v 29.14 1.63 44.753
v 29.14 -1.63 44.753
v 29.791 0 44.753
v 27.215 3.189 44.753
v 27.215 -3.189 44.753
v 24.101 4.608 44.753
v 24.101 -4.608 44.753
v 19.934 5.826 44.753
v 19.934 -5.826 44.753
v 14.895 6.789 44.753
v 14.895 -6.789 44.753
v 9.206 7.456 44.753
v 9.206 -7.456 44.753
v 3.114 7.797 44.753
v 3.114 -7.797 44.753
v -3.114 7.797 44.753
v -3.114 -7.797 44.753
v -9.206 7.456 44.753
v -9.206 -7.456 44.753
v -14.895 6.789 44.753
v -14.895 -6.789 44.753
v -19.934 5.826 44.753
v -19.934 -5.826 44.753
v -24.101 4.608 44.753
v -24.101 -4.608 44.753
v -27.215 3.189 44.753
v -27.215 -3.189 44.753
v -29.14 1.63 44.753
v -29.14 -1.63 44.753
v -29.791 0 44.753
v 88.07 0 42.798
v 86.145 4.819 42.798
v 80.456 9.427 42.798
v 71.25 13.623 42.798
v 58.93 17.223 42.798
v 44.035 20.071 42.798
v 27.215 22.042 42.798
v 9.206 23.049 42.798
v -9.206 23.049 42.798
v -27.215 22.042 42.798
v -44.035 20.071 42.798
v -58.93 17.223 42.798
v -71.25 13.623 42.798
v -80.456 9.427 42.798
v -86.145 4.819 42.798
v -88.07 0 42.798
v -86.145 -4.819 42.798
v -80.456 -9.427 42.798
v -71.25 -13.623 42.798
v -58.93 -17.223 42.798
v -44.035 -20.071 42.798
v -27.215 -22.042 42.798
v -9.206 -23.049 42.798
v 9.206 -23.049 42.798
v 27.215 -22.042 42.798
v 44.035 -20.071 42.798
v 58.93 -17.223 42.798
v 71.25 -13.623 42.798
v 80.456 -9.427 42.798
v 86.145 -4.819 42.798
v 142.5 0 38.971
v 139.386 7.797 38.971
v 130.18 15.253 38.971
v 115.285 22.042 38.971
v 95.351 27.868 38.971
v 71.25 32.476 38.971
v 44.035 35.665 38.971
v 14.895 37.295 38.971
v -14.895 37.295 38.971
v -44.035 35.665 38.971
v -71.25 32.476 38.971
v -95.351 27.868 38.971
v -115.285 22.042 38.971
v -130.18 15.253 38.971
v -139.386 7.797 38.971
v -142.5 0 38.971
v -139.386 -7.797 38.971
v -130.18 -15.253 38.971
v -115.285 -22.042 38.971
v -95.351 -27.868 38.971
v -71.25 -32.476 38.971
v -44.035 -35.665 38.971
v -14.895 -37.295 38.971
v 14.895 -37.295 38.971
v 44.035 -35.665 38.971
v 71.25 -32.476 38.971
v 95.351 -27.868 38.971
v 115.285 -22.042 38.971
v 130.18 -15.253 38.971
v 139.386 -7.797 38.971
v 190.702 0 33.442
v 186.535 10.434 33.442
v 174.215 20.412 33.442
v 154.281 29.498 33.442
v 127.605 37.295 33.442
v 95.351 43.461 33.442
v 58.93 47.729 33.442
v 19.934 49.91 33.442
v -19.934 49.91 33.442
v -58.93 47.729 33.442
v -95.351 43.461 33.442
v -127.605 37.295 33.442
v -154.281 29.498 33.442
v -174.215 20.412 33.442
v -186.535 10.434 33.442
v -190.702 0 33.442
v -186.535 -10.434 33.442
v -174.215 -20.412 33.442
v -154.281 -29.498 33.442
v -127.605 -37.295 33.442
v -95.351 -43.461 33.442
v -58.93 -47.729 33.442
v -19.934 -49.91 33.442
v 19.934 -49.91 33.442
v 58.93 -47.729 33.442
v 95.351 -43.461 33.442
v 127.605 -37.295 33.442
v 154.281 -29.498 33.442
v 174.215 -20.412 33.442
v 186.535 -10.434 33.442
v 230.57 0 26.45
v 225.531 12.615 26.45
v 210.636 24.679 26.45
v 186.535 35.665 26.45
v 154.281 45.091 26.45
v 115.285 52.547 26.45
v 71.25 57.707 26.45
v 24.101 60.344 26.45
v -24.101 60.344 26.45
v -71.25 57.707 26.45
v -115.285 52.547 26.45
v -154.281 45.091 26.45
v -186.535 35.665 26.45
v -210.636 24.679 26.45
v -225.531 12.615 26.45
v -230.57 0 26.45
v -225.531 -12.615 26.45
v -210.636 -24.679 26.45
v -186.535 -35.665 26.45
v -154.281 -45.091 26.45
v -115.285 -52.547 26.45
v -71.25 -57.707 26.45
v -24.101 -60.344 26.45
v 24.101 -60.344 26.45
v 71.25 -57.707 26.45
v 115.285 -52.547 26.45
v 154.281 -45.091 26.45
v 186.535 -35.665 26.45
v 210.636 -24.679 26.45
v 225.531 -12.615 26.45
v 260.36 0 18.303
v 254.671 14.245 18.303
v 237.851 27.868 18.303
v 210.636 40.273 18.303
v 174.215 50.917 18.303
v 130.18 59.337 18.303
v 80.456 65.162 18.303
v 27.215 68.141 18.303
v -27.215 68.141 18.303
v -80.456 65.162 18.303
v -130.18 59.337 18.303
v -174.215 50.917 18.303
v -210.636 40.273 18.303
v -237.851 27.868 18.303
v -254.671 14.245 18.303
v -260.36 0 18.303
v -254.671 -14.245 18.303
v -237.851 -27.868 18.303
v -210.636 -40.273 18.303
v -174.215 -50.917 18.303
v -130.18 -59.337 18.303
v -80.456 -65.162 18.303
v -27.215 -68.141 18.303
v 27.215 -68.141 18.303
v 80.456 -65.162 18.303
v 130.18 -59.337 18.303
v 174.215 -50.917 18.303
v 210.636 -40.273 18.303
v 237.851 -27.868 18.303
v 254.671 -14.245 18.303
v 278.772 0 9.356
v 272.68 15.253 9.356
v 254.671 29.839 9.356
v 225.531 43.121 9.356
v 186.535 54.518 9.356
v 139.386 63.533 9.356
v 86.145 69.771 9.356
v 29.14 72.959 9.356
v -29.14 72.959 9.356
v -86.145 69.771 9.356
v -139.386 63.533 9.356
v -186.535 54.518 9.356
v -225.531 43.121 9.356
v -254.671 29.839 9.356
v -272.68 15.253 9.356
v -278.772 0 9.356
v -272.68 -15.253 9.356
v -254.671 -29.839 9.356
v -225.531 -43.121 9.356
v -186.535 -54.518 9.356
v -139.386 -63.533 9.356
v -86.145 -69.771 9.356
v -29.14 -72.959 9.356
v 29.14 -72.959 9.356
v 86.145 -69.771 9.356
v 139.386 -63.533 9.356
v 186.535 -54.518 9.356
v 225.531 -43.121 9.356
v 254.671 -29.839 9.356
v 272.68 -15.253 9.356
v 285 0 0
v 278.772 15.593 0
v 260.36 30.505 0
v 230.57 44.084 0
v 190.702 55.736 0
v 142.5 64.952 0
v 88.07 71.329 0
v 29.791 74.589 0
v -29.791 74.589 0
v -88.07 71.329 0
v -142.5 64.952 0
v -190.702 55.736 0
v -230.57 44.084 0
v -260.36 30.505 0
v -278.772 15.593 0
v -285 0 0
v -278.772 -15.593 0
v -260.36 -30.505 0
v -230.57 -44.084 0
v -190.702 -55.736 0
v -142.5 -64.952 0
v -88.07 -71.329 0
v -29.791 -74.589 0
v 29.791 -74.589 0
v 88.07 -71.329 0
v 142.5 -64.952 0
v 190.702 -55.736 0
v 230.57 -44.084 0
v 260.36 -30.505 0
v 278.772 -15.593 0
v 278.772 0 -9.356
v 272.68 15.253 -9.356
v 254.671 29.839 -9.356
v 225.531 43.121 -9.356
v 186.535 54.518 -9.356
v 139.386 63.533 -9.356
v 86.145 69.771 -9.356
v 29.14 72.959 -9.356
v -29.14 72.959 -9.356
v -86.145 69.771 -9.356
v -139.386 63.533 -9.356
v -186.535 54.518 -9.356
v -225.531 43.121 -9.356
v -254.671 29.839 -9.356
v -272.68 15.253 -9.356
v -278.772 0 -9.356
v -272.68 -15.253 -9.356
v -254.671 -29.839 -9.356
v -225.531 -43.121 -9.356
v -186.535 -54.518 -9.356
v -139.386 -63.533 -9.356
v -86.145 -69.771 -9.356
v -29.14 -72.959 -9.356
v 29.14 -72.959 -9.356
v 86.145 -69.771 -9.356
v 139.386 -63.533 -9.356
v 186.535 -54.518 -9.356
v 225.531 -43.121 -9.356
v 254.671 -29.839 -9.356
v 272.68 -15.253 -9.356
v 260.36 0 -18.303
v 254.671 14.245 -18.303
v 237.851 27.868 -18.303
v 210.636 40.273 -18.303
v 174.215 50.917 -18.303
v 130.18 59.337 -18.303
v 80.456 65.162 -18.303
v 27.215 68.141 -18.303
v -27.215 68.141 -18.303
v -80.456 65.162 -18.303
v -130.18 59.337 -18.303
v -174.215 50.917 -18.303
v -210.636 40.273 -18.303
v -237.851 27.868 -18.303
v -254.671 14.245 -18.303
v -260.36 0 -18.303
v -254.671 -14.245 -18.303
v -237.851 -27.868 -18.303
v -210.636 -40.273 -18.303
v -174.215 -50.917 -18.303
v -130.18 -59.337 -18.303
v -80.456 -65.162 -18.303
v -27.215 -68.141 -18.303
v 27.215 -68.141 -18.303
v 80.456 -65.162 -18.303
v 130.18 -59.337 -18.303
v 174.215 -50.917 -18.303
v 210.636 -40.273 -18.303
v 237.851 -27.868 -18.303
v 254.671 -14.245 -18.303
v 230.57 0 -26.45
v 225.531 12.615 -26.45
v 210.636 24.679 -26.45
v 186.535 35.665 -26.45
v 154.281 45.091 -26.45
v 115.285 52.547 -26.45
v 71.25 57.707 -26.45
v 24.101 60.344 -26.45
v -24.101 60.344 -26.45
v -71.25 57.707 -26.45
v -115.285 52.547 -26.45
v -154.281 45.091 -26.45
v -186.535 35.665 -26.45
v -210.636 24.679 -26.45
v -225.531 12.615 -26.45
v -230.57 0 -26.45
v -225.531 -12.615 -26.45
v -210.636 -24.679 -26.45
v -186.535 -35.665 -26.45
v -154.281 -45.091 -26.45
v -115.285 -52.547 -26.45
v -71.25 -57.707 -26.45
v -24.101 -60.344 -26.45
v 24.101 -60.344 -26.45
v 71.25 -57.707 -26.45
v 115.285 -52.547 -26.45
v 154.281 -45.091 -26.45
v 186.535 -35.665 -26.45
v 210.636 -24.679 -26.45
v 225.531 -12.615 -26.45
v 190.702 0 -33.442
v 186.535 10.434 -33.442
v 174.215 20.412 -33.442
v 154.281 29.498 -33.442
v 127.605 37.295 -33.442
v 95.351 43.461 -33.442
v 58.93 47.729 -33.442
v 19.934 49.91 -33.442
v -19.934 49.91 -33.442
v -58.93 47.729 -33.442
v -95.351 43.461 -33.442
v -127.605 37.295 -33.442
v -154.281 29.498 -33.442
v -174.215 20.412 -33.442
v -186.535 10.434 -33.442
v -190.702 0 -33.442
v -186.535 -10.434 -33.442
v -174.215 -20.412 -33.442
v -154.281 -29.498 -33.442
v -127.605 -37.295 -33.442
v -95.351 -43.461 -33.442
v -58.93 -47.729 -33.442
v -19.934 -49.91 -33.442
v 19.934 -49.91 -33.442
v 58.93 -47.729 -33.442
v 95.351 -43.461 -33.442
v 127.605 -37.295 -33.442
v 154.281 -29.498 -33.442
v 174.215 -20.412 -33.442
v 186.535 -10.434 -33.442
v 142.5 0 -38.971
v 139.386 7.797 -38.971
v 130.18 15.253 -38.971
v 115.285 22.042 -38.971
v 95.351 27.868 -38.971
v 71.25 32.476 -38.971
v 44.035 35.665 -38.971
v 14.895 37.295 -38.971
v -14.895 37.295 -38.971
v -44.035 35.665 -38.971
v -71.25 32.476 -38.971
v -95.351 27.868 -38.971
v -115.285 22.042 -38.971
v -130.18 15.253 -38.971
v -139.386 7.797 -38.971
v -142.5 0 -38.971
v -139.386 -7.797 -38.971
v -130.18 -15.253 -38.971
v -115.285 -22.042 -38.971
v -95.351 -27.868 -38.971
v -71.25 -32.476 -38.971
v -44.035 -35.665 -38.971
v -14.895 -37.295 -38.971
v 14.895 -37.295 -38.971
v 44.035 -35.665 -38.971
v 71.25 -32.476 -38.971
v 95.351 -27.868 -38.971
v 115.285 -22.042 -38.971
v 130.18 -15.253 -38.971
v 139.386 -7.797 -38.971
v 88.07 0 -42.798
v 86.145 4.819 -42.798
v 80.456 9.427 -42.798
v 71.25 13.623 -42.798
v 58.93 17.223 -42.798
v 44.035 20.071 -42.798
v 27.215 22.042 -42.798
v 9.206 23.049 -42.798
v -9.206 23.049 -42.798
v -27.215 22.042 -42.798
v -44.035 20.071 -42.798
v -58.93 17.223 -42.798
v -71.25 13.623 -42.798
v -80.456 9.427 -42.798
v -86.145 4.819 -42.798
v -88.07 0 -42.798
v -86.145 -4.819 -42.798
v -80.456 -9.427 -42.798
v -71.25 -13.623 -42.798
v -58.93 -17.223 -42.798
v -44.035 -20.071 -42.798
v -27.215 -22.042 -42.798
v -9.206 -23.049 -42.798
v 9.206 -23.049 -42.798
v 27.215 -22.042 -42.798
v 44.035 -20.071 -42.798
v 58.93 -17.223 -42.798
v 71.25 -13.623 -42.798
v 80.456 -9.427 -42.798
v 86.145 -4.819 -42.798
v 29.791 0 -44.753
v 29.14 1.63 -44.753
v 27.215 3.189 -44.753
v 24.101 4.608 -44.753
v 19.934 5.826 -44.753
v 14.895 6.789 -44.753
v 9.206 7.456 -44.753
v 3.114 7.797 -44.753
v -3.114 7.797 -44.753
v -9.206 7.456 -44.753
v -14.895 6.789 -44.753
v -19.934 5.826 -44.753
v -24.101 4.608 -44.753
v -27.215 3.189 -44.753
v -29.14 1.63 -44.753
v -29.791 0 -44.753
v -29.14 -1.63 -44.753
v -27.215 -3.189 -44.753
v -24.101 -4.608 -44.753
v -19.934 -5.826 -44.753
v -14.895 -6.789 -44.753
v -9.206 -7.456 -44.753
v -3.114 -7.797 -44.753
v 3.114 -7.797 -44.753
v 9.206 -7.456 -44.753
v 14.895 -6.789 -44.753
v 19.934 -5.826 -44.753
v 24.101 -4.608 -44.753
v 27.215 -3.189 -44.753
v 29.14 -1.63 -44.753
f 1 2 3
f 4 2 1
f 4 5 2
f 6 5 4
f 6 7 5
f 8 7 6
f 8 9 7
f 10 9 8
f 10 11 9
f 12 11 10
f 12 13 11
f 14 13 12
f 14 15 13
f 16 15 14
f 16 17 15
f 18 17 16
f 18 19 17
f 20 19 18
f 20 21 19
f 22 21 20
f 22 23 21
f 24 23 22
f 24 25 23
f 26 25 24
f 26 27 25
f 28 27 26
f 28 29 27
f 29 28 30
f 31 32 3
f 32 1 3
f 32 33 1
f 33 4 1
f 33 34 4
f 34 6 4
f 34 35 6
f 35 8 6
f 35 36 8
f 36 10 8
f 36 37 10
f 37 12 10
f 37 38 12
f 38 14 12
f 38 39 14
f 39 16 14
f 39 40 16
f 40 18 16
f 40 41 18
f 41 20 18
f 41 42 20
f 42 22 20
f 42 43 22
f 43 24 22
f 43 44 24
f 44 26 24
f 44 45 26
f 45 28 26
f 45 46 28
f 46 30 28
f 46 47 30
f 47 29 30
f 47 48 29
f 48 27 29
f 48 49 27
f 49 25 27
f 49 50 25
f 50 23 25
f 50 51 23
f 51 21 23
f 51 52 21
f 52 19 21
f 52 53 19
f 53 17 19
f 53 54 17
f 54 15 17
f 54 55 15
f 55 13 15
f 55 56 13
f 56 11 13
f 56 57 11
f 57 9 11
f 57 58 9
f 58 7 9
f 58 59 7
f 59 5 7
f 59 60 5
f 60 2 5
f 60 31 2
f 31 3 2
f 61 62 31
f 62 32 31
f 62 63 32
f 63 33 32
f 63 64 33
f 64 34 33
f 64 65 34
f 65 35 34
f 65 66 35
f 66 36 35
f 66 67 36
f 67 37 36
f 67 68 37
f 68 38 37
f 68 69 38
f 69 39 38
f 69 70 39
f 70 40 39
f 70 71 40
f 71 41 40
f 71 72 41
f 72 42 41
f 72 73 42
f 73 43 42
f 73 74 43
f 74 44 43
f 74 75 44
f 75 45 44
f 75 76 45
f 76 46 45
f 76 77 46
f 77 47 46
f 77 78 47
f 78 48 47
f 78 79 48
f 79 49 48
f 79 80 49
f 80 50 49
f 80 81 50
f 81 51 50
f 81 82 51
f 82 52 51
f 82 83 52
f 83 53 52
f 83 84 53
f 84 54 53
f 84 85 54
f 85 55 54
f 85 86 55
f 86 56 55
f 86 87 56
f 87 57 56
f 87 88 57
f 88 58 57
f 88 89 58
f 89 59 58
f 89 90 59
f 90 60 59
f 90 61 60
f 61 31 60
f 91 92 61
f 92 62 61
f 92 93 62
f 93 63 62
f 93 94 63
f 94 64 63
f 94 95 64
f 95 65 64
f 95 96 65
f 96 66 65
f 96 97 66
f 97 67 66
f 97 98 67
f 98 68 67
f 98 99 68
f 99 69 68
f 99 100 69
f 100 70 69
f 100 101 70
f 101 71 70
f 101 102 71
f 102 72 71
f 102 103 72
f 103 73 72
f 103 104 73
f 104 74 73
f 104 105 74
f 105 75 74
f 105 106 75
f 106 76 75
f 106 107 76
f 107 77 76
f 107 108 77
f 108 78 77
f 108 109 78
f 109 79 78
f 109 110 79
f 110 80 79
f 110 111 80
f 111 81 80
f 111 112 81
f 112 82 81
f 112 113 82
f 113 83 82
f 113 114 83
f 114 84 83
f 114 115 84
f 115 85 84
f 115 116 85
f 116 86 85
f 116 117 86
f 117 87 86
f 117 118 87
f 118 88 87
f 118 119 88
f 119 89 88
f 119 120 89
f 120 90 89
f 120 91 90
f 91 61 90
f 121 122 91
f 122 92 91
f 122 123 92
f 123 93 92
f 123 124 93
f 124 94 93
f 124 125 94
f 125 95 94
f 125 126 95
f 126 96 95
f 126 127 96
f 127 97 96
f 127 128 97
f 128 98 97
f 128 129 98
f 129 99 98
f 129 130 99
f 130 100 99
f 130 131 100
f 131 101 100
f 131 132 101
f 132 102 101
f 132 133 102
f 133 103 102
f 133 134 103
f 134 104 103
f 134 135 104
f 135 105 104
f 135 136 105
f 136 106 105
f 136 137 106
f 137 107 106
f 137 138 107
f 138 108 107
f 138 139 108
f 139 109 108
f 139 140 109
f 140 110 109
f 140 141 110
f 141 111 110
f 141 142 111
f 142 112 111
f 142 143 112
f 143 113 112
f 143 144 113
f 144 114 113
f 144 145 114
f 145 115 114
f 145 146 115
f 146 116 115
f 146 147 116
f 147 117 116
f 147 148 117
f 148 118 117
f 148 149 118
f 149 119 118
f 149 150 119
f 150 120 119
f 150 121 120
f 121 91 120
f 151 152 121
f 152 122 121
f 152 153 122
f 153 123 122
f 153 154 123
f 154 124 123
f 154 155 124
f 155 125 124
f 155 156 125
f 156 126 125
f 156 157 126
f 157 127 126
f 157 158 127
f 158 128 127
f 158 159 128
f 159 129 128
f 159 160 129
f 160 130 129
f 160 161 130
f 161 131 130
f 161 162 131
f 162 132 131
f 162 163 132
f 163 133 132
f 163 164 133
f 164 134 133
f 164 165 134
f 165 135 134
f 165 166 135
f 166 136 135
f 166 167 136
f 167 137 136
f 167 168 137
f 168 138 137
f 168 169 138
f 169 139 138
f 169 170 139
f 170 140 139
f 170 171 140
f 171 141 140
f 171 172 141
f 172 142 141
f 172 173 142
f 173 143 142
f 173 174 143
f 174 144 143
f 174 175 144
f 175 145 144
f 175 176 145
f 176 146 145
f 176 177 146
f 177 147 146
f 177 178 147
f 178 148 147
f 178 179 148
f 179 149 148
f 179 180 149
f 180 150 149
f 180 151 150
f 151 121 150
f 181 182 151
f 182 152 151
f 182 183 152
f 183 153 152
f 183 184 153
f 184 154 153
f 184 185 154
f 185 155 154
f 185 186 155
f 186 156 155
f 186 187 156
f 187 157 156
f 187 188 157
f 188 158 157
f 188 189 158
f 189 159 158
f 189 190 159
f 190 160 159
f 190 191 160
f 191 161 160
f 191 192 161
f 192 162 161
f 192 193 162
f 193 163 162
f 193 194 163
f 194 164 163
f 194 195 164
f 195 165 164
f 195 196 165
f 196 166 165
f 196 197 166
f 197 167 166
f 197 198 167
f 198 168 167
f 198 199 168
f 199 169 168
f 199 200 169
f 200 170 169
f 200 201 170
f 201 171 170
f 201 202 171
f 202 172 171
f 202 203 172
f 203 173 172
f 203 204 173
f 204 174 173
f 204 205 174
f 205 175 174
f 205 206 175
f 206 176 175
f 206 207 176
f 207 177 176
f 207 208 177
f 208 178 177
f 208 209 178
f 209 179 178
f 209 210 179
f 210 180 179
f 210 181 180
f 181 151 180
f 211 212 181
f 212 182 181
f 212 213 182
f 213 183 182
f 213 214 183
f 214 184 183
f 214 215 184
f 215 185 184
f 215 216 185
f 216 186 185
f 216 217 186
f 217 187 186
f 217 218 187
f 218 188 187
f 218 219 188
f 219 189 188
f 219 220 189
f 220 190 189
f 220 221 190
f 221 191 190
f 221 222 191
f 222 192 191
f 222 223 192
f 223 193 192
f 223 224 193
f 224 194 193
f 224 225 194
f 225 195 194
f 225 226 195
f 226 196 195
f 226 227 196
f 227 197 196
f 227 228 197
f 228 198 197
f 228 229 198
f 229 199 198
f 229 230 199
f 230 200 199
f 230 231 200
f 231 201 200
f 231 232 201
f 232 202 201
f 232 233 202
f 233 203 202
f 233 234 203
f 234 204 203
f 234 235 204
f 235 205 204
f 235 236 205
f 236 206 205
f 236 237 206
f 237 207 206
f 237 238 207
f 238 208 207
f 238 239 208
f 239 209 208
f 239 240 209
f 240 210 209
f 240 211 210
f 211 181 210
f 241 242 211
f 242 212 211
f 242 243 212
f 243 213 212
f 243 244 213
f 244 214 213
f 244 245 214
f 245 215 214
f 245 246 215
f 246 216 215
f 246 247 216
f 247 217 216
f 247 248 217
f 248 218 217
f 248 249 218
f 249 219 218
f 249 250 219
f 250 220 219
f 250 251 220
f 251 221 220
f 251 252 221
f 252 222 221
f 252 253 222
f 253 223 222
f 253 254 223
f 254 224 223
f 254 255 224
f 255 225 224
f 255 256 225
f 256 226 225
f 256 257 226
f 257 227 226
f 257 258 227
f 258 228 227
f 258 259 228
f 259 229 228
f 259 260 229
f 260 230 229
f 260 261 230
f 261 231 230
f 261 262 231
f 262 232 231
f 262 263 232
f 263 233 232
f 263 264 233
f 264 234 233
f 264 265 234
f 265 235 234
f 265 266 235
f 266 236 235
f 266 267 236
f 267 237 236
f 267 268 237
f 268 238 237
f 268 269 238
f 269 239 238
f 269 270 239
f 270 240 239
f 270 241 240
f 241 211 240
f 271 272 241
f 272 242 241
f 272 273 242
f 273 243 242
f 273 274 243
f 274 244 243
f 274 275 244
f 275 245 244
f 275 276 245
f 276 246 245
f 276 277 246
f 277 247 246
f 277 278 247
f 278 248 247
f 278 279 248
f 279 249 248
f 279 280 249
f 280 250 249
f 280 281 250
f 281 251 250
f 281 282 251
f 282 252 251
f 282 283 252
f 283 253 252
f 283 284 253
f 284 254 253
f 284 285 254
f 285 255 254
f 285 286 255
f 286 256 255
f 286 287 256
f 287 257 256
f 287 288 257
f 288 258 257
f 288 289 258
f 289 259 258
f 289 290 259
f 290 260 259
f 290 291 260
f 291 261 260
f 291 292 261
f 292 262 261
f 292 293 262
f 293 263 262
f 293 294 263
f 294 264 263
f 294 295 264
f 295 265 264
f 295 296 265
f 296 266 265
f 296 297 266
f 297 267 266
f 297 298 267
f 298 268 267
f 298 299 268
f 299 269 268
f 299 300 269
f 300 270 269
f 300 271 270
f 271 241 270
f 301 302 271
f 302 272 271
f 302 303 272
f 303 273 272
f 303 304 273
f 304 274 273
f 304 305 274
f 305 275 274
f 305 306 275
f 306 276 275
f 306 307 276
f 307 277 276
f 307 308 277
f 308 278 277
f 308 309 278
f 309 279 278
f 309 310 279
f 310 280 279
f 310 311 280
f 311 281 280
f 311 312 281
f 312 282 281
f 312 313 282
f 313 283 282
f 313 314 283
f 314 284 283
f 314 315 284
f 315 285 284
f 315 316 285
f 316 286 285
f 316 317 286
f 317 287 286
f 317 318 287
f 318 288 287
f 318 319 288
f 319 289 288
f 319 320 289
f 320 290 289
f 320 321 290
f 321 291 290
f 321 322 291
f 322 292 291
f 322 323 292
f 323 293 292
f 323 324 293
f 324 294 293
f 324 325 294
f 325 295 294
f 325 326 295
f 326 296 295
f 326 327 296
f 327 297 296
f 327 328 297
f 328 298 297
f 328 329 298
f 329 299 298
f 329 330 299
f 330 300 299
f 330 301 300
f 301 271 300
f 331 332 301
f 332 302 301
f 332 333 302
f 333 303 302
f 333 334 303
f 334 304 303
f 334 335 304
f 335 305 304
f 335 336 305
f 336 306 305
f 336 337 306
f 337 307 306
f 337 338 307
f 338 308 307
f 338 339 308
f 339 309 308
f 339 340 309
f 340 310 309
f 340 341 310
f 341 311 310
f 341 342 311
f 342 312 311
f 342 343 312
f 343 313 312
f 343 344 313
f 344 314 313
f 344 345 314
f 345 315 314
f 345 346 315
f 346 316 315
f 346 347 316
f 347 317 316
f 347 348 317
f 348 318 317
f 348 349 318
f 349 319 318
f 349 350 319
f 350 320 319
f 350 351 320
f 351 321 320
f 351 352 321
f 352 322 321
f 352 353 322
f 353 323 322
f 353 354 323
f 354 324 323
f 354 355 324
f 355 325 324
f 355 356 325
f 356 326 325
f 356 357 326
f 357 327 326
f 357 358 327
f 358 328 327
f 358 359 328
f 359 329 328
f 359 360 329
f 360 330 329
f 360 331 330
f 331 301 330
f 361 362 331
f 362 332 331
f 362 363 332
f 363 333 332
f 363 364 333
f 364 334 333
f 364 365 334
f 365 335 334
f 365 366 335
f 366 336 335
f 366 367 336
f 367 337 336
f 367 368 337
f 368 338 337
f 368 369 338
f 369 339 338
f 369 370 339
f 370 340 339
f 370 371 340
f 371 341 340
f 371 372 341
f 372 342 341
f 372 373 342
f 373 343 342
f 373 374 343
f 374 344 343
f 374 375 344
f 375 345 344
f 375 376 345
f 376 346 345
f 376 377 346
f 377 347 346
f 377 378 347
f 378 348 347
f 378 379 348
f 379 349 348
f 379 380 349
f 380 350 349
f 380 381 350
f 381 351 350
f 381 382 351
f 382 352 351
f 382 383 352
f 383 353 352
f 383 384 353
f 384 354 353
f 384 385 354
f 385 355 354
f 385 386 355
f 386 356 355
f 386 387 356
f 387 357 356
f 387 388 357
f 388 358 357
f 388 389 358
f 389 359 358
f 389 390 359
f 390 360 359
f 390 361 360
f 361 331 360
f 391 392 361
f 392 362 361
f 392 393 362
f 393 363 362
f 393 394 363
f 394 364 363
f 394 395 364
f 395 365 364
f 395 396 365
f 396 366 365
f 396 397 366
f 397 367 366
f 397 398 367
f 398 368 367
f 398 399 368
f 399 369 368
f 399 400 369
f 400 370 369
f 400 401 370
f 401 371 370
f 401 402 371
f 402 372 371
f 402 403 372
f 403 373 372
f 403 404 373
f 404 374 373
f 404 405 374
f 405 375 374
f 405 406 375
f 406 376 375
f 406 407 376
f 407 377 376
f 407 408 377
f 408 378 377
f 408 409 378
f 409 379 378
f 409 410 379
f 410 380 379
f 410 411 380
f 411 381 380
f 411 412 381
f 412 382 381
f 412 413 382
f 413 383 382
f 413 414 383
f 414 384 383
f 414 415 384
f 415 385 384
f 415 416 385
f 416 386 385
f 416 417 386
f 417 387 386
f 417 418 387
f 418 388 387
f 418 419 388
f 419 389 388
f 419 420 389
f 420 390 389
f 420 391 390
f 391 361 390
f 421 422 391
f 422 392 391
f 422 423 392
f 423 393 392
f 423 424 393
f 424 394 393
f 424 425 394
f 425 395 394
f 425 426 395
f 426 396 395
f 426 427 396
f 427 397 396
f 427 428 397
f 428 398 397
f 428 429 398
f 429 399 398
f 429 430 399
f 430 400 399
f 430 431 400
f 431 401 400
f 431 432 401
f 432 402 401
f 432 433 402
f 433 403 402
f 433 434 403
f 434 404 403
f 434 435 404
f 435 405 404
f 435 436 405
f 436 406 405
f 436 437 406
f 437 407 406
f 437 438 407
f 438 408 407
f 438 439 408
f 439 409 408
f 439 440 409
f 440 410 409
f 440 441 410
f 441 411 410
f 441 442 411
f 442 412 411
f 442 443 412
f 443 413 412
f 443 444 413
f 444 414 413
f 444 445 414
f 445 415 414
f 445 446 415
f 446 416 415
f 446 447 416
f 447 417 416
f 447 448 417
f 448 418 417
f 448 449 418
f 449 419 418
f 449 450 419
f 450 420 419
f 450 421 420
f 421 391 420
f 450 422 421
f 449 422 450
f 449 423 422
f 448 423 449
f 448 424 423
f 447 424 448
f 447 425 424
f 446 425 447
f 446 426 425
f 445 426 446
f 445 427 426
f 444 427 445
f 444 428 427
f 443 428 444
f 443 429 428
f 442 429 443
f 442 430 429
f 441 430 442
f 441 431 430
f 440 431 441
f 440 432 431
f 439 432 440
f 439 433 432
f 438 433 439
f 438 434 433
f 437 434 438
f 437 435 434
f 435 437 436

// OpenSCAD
// Generated by SolidPython 1.0.1 on 2020-07-29 00:46:53


scale(v = [19, 5, 3]) {
	sphere(r = 15);
}
/***********************************************
*********      SolidPython code:      **********
************************************************
 
# import packages: SolidPython
from solid import *
from solid.utils import *
from itertools import chain, combinations, permutations


class Resize:

    def __init__(self, scad_file):
        self.scad_file = scad_file
        #self.scad_file = import_scad(scad_file)
        # cone/cylinder param:
        self.r1 = 0
        self.r2 = 0
        self.h = 0
        # rectangular prism param:
        self.w = 0
        self.l = 0
        # ellipse param:
        self.r = 0

    # import OpenScad code (file name corresponds to shape)


    # classify shape + parameters
    def assign(self, param1, param2, param3):
        if self.scad_file == 'cone.scad':
            self.r1 = param1
            self.r2 = param2
            self.h = param3
        elif self.scad_file == 'cylinder.scad':
            self.r1 = param1
            self.r2 = param2
            self.h = param3
        elif self.scad_file == 'rectangularPrism.scad':
            self.h = param1
            self.l = param2
            self.w = param3
        else:
            self.r = param1
            self.h = param2

    # resize parameters
    def iterate(self):
        x = range(3, 20, 2)
        i = 1
        if self.scad_file == 'cone.scad':
            tempList = list(permutations(x, 2))
            for temp in tempList:
                param1 = temp[0]
                param2 = temp[1]
                filepath = 'produced_scad_files/' + 'cone' + str(param1) + '_' + str(param2) + '_' + '.scad'
                scad_render_to_file(cylinder(h=param1, r1=param2, r2=0), filepath)

        elif self.scad_file == 'cylinder.scad':
            tempList = list(permutations(x, 3))
            for temp in tempList:
                param1 = temp[0]
                param2 = temp[1]
                filepath = 'produced_scad_files/' + 'cylinder' + str(param1) + '_' + str(param2) + '_' + '.scad'
                scad_render_to_file(cylinder(h=param1, r1=param2, r2=param2), filepath)

        elif self.scad_file == 'rectangularPrism.scad':
            tempList = list(permutations(x, 3))
            for temp in tempList:
                param1 = temp[0]
                param2 = temp[1]
                param3 = temp[2]
                filepath = 'produced_scad_files/' + 'rectangularPrism' + str(param1) + '_' + str(param2) + '_' + str(
                    param3) + '.scad'
                scad_render_to_file(cube(size=(param1, param2, param3)), filepath)

        elif self.scad_file == 'ellipse.scad':
            tempList = list(permutations(x, 4))
            for temp in tempList:
                param1 = temp[0]
                param2 = temp[1]
                param3 = temp[2]
                param4 = temp[3]
                filepath = 'produced_scad_files/' + 'ellipse' + str(param1) + '_' + str(param2) + '_' + str(param3) + '_' + str(param4) + '.scad'
                scad_render_to_file(scale([param1, param2, param3])(sphere(r=param4)), filepath)

    def render_to_scadfile(self):
        scad_render_to_file(scad, 'example.scad') 
 
************************************************/
